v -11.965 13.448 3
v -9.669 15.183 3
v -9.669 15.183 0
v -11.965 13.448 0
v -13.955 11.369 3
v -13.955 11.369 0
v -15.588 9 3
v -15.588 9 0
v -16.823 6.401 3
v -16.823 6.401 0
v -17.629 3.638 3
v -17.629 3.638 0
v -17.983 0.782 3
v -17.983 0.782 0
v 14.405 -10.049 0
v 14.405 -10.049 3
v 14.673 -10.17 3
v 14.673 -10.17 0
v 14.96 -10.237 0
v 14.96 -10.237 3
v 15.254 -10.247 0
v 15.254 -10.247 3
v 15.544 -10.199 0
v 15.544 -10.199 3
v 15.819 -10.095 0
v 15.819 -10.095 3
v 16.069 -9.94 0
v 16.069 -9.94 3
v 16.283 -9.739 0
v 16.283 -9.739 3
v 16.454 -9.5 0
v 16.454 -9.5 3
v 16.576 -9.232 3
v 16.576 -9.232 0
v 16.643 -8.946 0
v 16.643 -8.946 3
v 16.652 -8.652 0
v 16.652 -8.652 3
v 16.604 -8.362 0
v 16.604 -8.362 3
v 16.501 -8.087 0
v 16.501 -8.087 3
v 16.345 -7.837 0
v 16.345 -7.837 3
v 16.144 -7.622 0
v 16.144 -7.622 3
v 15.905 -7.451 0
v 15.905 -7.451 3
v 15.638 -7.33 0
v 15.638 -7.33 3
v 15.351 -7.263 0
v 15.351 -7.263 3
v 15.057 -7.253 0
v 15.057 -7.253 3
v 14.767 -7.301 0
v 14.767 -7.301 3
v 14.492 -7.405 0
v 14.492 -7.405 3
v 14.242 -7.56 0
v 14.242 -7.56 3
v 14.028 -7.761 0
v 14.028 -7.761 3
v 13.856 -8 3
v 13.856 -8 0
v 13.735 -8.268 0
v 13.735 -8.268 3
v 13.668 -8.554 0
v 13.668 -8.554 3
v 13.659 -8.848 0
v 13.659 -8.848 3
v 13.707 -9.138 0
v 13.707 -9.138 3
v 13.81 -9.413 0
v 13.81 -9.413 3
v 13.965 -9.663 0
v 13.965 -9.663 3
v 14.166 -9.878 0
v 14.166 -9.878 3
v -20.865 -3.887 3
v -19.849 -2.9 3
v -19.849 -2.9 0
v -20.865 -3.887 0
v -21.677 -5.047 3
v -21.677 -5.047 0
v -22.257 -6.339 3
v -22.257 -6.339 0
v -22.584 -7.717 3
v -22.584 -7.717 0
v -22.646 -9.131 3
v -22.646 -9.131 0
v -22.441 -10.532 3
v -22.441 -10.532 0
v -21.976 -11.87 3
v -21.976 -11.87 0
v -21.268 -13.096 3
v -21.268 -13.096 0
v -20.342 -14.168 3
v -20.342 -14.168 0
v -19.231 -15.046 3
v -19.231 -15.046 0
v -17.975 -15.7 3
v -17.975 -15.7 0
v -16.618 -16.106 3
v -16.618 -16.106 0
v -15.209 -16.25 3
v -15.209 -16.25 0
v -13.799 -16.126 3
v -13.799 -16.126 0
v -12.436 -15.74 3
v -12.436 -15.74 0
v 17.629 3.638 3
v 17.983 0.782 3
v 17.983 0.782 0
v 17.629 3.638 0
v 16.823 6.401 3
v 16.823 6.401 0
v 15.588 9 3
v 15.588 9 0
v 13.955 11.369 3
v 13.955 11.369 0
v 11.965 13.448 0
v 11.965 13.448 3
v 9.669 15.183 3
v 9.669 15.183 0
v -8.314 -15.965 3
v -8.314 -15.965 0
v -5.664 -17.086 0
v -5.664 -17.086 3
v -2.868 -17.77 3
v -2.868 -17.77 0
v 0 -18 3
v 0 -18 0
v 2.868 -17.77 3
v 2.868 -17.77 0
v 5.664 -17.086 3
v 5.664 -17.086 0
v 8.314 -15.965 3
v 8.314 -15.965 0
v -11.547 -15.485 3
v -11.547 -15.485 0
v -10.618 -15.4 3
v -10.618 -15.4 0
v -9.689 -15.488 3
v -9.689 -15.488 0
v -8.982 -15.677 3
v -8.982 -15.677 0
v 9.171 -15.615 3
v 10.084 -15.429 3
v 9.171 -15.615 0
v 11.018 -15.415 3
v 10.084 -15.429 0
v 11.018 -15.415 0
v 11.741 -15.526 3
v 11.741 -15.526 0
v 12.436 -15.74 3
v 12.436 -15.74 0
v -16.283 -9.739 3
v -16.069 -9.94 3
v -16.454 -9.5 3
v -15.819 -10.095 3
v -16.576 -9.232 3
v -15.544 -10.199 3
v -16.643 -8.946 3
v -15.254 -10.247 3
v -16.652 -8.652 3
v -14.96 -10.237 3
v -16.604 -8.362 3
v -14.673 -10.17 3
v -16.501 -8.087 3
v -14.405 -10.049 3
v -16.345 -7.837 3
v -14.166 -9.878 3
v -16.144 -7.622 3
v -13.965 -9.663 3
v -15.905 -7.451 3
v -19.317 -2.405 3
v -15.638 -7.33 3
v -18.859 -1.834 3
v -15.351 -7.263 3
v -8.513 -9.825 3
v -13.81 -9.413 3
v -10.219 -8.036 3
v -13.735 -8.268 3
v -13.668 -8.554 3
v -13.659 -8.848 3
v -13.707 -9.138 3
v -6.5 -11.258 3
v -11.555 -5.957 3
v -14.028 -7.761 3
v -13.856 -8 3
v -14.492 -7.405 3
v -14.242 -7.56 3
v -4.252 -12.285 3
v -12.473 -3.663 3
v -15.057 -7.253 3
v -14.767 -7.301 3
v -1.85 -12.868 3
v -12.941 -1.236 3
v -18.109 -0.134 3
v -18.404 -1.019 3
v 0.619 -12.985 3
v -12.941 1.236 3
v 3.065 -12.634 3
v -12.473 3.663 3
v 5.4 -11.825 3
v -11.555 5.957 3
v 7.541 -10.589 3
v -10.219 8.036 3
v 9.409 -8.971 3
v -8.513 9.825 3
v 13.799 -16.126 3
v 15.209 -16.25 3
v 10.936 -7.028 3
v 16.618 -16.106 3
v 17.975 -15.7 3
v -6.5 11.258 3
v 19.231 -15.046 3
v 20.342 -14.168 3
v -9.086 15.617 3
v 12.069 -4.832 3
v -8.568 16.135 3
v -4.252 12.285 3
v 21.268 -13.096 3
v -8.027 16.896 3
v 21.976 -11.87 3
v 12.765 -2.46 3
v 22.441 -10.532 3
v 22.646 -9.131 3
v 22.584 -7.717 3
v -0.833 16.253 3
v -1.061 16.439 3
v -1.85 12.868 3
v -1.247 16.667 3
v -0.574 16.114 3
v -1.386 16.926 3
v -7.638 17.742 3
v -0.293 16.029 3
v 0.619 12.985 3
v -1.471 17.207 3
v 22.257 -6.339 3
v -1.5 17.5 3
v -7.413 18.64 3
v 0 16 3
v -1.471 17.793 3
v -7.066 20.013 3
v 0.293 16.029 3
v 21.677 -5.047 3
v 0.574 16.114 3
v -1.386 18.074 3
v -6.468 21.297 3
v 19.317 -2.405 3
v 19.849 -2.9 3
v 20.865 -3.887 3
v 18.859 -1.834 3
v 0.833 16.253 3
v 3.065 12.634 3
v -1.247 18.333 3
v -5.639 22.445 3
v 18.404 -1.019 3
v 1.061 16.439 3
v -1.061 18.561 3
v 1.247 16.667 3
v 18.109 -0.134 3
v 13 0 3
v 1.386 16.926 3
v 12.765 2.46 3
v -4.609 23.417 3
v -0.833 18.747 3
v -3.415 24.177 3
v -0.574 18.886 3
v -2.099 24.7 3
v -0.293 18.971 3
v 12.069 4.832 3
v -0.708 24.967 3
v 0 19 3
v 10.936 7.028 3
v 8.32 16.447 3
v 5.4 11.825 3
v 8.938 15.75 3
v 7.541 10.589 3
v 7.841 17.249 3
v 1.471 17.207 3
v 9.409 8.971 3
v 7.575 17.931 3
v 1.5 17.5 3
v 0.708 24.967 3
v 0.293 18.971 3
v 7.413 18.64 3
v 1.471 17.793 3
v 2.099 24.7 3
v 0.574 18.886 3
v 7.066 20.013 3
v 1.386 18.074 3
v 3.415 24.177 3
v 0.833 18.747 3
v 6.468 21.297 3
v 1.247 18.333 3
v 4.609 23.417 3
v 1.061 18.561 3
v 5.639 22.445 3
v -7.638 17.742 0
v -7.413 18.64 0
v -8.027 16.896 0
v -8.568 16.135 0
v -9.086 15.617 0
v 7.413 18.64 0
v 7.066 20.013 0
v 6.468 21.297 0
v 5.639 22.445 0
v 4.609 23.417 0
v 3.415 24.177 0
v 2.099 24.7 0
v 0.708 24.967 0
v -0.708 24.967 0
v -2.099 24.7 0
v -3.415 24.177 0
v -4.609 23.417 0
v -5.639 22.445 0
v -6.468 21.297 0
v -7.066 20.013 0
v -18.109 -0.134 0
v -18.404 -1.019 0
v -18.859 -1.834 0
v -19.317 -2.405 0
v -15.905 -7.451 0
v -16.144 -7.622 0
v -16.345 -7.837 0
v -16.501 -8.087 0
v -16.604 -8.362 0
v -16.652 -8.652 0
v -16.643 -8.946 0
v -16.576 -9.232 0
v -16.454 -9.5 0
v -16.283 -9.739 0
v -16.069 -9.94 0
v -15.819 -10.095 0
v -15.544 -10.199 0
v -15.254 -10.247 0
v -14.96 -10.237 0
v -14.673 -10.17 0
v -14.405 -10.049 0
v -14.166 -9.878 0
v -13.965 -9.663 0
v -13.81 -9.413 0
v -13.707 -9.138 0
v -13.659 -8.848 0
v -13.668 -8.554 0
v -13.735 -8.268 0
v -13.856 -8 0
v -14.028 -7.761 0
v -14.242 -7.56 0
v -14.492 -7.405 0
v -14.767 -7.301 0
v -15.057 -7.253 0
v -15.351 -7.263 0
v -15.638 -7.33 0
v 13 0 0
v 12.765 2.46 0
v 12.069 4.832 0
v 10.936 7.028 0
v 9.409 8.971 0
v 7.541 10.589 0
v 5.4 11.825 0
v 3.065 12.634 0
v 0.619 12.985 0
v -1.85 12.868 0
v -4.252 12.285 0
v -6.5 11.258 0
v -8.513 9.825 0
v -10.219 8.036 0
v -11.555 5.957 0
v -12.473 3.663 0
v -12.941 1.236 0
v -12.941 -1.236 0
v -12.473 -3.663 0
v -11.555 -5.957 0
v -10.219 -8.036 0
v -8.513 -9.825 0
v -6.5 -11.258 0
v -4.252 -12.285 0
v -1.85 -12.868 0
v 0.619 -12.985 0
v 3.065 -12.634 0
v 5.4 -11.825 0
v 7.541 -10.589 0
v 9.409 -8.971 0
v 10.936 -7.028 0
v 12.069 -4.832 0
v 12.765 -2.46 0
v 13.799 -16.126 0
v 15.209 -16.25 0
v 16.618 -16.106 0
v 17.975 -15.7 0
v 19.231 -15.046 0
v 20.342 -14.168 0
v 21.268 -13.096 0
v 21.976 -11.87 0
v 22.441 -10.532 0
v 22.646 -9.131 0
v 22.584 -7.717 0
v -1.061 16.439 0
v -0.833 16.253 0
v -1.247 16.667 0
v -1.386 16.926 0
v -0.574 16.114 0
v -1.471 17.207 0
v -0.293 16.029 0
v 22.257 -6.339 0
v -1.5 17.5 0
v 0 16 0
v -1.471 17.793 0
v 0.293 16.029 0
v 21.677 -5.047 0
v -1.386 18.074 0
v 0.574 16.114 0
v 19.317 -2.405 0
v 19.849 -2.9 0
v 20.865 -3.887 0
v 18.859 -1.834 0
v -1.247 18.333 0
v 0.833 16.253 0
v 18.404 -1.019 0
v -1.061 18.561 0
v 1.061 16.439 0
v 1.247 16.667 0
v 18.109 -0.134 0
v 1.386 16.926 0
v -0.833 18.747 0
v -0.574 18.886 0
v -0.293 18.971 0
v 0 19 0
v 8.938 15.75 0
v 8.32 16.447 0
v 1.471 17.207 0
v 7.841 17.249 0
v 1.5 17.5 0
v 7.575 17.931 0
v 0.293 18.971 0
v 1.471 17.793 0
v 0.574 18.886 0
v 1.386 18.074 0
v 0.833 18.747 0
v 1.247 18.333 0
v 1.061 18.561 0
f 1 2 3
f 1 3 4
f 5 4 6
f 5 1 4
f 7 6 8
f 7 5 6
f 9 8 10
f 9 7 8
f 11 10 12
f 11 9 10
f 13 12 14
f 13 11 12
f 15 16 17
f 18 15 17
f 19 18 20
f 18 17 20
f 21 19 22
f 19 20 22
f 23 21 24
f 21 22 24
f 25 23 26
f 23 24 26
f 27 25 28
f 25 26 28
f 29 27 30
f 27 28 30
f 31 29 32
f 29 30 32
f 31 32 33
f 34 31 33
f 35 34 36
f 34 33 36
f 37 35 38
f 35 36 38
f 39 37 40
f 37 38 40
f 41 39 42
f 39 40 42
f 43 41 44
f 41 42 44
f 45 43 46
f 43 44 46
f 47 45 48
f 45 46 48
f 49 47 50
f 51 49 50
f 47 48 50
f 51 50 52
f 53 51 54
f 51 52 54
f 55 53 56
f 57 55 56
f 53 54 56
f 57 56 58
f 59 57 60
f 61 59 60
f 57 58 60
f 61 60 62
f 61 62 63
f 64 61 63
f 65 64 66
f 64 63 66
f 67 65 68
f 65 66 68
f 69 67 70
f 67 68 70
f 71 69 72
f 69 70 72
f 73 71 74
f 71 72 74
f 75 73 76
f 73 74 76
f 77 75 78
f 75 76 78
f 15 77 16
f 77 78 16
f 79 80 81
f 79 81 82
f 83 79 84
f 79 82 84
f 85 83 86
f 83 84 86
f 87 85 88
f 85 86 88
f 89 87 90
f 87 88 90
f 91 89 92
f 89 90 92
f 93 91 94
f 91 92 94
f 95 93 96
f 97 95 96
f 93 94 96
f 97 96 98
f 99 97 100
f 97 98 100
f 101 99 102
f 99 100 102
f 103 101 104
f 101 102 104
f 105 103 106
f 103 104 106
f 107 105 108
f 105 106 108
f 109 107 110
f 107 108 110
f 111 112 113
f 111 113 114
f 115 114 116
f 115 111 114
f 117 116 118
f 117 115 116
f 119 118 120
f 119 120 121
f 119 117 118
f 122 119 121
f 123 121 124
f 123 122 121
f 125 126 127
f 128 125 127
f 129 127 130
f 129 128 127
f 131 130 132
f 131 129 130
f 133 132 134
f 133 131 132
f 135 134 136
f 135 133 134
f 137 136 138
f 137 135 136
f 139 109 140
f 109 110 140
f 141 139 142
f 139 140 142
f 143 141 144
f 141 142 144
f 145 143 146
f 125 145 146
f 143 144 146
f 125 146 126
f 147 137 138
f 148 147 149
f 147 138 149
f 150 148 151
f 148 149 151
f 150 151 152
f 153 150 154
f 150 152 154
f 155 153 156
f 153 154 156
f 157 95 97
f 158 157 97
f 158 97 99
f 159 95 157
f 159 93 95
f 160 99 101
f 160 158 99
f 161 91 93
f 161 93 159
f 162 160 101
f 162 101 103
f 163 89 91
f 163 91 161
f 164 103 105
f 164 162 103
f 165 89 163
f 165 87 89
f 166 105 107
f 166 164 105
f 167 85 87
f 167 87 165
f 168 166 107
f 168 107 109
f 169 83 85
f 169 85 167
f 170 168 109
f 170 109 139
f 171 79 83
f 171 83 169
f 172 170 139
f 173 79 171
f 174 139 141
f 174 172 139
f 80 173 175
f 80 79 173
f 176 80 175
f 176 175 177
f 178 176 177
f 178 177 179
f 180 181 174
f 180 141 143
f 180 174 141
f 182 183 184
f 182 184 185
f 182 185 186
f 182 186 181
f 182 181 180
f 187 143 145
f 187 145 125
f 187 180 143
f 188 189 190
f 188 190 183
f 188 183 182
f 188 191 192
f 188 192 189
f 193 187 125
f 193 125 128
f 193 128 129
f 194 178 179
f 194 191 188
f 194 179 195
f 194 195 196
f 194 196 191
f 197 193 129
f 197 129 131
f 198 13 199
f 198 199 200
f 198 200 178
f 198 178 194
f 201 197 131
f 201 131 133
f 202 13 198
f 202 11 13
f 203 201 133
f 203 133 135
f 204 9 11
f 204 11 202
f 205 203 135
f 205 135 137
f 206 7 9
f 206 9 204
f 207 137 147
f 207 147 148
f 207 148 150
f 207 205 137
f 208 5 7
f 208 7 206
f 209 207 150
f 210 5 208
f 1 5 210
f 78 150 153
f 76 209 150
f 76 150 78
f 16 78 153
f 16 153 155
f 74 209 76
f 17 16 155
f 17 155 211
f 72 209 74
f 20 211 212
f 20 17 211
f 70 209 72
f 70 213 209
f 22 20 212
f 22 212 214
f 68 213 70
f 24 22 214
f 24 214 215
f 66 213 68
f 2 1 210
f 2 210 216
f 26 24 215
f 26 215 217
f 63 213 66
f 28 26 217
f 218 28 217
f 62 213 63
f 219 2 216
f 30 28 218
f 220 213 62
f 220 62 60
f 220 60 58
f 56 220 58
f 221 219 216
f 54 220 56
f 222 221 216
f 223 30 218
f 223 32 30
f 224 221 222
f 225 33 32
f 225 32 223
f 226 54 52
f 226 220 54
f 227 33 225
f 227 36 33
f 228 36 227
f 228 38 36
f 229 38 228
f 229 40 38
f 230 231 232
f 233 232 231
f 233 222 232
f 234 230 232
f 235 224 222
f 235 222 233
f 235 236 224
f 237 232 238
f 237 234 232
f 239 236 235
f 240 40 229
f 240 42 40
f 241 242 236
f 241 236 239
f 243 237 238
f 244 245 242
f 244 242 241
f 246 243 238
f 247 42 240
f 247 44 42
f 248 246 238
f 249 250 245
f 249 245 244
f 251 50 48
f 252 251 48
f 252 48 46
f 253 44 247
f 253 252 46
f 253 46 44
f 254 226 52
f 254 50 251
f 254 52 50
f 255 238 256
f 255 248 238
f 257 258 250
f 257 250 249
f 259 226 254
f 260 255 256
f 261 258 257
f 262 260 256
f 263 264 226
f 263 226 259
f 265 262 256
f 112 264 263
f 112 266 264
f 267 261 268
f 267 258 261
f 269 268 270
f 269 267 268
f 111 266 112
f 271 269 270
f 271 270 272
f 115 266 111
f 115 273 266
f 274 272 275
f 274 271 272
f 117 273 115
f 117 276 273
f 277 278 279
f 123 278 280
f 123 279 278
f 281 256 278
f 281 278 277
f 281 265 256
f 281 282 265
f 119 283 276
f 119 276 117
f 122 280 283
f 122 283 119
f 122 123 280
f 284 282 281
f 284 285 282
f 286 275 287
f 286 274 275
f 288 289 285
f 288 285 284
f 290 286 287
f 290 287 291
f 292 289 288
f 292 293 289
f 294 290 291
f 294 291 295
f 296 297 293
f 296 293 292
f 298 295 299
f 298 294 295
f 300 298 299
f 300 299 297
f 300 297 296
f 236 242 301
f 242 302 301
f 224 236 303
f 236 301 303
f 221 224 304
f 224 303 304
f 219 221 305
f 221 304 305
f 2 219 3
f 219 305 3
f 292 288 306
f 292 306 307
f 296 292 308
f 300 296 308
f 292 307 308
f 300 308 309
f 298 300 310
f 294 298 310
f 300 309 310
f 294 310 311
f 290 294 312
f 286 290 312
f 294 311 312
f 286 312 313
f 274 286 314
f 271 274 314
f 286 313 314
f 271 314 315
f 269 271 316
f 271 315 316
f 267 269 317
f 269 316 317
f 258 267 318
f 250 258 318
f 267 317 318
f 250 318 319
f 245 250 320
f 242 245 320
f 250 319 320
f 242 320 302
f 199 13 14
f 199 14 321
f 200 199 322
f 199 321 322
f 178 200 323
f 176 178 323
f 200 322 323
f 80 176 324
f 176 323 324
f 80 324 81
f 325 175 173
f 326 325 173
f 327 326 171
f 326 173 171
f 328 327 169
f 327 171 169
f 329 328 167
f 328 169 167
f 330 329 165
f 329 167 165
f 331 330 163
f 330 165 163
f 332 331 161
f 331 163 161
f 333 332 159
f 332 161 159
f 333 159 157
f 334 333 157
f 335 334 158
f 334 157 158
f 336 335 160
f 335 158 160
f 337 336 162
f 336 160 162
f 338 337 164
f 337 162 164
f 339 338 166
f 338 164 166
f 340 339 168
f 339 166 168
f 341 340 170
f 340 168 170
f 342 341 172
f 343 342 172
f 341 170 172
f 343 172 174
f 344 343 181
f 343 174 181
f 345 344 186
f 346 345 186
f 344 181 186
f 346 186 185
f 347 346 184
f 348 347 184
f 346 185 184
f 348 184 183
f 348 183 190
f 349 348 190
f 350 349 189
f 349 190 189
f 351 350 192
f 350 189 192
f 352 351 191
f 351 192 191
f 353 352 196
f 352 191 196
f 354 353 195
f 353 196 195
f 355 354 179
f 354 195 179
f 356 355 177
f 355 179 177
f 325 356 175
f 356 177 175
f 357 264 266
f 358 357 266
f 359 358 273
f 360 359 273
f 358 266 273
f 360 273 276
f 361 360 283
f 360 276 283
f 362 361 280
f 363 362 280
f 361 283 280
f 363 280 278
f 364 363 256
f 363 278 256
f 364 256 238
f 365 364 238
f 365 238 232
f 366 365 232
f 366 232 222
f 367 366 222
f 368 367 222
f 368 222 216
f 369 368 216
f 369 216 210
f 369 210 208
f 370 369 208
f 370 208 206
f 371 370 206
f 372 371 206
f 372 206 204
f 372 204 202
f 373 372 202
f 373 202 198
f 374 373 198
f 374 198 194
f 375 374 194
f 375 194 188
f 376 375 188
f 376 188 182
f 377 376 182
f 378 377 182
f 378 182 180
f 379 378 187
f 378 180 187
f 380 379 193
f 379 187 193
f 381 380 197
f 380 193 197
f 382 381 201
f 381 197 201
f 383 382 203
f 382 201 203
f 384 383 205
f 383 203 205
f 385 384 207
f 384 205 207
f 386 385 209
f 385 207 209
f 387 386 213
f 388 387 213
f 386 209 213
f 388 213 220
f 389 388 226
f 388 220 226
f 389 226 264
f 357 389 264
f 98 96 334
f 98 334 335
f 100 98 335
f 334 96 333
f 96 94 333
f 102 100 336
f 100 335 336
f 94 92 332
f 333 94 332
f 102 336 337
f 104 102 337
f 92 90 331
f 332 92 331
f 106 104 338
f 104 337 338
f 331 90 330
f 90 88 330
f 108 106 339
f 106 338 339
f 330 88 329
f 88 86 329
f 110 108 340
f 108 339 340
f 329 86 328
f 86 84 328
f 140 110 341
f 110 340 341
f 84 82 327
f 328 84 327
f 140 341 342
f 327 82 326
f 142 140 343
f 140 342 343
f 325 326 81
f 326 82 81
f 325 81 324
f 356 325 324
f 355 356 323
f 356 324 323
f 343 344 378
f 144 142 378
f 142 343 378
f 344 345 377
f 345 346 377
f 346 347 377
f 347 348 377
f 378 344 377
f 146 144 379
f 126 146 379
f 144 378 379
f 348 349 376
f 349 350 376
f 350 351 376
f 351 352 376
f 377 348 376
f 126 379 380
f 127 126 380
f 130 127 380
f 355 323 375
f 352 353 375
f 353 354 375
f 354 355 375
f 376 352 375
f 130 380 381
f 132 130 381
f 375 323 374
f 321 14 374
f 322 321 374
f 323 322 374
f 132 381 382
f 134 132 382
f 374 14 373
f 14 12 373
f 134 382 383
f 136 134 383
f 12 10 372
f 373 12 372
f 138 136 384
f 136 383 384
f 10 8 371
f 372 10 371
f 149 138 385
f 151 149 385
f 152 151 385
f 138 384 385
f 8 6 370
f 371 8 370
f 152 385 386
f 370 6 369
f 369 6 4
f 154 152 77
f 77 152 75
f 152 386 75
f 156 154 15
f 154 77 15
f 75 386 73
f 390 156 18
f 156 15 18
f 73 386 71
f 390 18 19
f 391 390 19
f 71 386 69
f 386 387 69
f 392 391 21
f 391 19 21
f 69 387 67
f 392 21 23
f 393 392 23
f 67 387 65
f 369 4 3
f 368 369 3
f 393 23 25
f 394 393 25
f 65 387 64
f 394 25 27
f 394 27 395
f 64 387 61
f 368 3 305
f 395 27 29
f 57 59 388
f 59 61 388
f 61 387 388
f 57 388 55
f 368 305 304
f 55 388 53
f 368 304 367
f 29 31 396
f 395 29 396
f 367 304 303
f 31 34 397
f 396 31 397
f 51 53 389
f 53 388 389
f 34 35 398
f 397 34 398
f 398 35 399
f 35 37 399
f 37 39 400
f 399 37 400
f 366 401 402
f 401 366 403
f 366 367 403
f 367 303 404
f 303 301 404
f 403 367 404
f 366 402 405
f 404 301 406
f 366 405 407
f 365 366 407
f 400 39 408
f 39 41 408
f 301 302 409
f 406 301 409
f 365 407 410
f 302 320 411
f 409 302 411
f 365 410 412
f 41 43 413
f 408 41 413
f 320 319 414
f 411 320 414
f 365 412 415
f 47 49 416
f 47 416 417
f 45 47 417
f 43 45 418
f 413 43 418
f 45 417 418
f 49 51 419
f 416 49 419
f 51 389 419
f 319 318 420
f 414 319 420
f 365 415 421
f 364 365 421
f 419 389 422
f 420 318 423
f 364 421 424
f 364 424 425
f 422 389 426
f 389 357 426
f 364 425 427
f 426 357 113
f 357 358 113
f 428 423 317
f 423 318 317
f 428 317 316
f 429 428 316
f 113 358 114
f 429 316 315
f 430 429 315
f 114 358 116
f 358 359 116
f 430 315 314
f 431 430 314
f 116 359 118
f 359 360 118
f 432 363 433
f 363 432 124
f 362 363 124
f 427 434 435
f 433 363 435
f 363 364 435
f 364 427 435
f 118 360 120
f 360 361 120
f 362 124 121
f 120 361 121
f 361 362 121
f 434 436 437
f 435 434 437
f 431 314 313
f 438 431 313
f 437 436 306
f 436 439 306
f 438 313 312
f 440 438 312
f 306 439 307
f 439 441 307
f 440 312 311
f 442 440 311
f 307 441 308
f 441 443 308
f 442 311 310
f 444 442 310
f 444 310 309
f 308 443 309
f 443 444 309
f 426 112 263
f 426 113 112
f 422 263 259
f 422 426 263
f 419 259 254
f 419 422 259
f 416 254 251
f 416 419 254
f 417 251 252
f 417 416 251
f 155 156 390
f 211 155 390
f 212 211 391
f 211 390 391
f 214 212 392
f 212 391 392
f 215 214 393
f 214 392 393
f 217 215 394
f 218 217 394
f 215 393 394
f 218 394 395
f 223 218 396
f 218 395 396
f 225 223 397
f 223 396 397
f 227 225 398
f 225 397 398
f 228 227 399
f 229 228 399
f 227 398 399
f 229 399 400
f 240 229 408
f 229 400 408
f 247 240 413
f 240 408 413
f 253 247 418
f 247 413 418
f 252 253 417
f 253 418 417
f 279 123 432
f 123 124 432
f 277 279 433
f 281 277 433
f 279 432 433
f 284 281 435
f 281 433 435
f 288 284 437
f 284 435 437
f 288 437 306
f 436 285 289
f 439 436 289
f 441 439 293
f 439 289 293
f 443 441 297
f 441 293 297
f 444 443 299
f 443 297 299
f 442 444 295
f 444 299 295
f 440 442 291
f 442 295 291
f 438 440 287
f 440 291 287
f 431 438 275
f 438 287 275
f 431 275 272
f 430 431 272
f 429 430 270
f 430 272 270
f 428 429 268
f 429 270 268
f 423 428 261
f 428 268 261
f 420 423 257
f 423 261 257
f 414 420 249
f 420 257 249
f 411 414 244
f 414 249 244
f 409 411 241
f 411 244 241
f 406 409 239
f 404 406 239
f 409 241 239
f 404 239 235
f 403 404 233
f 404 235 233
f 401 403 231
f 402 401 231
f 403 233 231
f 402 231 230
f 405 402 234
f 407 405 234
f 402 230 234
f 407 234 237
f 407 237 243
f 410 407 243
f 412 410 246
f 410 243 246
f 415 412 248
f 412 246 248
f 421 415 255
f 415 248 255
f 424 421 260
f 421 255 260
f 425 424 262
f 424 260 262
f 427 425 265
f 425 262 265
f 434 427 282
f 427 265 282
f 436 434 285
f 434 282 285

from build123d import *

# Parameters (mm, degrees)
SKETCH_2_R               = 8.75
EXTRUDE_1_DEPTH          = 3
SKETCH_3_R               = 1.5
CUT_EXTRUDE_1_DEPTH      = 34.87136207
PATTERN_CIRCULAR_1_COUNT = 3
PATTERN_CIRCULAR_1_ANGLE = 240
SKETCH_4_R               = 18
EXTRUDE_2_DEPTH          = 3
FILLET_1_R               = 5
SKETCH_5_R               = 13
CUT_EXTRUDE_2_DEPTH      = 34.87136222
SKETCH_6_R               = 1.5
CUT_EXTRUDE_3_DEPTH      = 34.87136222
PATTERN_CIRCULAR_2_COUNT = 3
PATTERN_CIRCULAR_2_ANGLE = 240


with BuildPart() as part:
    # 草图2 → 凸台-拉伸1 (new body)
    with BuildSketch(Plane.XY):
        with BuildLine():
            ThreePointArc((11.405444566, -15.245190528), (21.650635095, -12.5), (18.905444566, -2.254809472))
            ThreePointArc((18.905444566, -2.254809472), (10.556079661, 6.094555434), (7.5, 17.5))
            ThreePointArc((7.5, 17.5), (0, 25), (-7.5, 17.5))
            ThreePointArc((-7.5, 17.5), (-10.556079661, 6.094555434), (-18.905444566, -2.254809472))
            ThreePointArc((-18.905444566, -2.254809472), (-21.650635095, -12.5), (-11.405444566, -15.245190528))
            ThreePointArc((-11.405444566, -15.245190528), (0, -12.189110868), (11.405444566, -15.245190528))
        make_face()
        Circle(SKETCH_2_R, mode=Mode.SUBTRACT)
    extrude(amount=EXTRUDE_1_DEPTH)

    # 草图3 → 切除-拉伸1 (cut, through all)
    with BuildSketch(Plane.XY.offset(3)):
        with Locations((0, 17.5)):
            Circle(SKETCH_3_R)
    cut_extrude_1 = extrude(amount=-CUT_EXTRUDE_1_DEPTH, mode=Mode.SUBTRACT)

    # 阵列(圆周)1: 切除-拉伸1 ×3 about axis
    pattern_circular_1_axis = Axis((0, 0, 0), (0, 0, -1))
    for i in range(1, PATTERN_CIRCULAR_1_COUNT):
        add(cut_extrude_1.rotate(pattern_circular_1_axis, i * PATTERN_CIRCULAR_1_ANGLE / (PATTERN_CIRCULAR_1_COUNT - 1)), mode=Mode.SUBTRACT)

    # 草图4 → 凸台-拉伸2 (add)
    with BuildSketch(Plane.XY.offset(3)):
        Circle(SKETCH_4_R)
    extrude(amount=-EXTRUDE_2_DEPTH)

    # 圆角1
    fillet_1_edges = [part.edges().sort_by_distance(p)[0] for p in [
        (17.923796485, -1.65454512, 1.5),
        (7.529020137, 16.349735649, 1.5),
        (-7.529020137, 16.349735649, 1.5),
        (-17.923796485, -1.65454512, 1.5),
        (-10.394776348, -14.695190528, 1.5),
        (10.394776348, -14.695190528, 1.5),
    ]]
    fillet(fillet_1_edges, radius=FILLET_1_R)

    # 草图5 → 切除-拉伸2 (cut, through all)
    with BuildSketch(Plane.XY.offset(3)):
        Circle(SKETCH_5_R)
    extrude(amount=-CUT_EXTRUDE_2_DEPTH, mode=Mode.SUBTRACT)

    # 草图6 → 切除-拉伸3 (cut, through all)
    with BuildSketch(Plane.XY.offset(3)):
        with Locations((0, 17.5)):
            Circle(SKETCH_6_R)
    extrude(amount=-CUT_EXTRUDE_3_DEPTH, mode=Mode.SUBTRACT)

    # 阵列(圆周)2: 切除-拉伸1 ×3 about axis
    pattern_circular_2_axis = Axis((0, 0, -50.911688245), (0, 0, 1))
    for i in range(1, PATTERN_CIRCULAR_2_COUNT):
        add(cut_extrude_1.rotate(pattern_circular_2_axis, i * PATTERN_CIRCULAR_2_ANGLE / (PATTERN_CIRCULAR_2_COUNT - 1)), mode=Mode.SUBTRACT)


solid = part.part
